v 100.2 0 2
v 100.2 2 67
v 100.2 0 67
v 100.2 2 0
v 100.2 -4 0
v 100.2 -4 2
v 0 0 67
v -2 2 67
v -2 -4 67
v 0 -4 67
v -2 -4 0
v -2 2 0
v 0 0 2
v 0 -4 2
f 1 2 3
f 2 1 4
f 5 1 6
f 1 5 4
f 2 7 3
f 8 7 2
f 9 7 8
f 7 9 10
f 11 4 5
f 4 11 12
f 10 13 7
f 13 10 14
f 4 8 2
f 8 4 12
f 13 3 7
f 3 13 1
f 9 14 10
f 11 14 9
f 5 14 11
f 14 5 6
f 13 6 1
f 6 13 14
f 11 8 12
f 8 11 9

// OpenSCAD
screen_cover_width = 100.2;
screen_cover_height = 67;
screen_cover_depth = 2;
overhang_length = 4;

union () {
    // Cover
    cube([screen_cover_width, screen_cover_depth, screen_cover_height]);
    // Overhang to keep cover in place
    rotate([90, 0, 0]) cube([screen_cover_width, screen_cover_depth, overhang_length]);
    // Left side bar cause cover keeps getting pushed right
    translate([0, -overhang_length, screen_cover_height]) {
        rotate([0, 90, 90]) {
            cube([screen_cover_height, screen_cover_depth, overhang_length + screen_cover_depth]);
        }
    }
}
